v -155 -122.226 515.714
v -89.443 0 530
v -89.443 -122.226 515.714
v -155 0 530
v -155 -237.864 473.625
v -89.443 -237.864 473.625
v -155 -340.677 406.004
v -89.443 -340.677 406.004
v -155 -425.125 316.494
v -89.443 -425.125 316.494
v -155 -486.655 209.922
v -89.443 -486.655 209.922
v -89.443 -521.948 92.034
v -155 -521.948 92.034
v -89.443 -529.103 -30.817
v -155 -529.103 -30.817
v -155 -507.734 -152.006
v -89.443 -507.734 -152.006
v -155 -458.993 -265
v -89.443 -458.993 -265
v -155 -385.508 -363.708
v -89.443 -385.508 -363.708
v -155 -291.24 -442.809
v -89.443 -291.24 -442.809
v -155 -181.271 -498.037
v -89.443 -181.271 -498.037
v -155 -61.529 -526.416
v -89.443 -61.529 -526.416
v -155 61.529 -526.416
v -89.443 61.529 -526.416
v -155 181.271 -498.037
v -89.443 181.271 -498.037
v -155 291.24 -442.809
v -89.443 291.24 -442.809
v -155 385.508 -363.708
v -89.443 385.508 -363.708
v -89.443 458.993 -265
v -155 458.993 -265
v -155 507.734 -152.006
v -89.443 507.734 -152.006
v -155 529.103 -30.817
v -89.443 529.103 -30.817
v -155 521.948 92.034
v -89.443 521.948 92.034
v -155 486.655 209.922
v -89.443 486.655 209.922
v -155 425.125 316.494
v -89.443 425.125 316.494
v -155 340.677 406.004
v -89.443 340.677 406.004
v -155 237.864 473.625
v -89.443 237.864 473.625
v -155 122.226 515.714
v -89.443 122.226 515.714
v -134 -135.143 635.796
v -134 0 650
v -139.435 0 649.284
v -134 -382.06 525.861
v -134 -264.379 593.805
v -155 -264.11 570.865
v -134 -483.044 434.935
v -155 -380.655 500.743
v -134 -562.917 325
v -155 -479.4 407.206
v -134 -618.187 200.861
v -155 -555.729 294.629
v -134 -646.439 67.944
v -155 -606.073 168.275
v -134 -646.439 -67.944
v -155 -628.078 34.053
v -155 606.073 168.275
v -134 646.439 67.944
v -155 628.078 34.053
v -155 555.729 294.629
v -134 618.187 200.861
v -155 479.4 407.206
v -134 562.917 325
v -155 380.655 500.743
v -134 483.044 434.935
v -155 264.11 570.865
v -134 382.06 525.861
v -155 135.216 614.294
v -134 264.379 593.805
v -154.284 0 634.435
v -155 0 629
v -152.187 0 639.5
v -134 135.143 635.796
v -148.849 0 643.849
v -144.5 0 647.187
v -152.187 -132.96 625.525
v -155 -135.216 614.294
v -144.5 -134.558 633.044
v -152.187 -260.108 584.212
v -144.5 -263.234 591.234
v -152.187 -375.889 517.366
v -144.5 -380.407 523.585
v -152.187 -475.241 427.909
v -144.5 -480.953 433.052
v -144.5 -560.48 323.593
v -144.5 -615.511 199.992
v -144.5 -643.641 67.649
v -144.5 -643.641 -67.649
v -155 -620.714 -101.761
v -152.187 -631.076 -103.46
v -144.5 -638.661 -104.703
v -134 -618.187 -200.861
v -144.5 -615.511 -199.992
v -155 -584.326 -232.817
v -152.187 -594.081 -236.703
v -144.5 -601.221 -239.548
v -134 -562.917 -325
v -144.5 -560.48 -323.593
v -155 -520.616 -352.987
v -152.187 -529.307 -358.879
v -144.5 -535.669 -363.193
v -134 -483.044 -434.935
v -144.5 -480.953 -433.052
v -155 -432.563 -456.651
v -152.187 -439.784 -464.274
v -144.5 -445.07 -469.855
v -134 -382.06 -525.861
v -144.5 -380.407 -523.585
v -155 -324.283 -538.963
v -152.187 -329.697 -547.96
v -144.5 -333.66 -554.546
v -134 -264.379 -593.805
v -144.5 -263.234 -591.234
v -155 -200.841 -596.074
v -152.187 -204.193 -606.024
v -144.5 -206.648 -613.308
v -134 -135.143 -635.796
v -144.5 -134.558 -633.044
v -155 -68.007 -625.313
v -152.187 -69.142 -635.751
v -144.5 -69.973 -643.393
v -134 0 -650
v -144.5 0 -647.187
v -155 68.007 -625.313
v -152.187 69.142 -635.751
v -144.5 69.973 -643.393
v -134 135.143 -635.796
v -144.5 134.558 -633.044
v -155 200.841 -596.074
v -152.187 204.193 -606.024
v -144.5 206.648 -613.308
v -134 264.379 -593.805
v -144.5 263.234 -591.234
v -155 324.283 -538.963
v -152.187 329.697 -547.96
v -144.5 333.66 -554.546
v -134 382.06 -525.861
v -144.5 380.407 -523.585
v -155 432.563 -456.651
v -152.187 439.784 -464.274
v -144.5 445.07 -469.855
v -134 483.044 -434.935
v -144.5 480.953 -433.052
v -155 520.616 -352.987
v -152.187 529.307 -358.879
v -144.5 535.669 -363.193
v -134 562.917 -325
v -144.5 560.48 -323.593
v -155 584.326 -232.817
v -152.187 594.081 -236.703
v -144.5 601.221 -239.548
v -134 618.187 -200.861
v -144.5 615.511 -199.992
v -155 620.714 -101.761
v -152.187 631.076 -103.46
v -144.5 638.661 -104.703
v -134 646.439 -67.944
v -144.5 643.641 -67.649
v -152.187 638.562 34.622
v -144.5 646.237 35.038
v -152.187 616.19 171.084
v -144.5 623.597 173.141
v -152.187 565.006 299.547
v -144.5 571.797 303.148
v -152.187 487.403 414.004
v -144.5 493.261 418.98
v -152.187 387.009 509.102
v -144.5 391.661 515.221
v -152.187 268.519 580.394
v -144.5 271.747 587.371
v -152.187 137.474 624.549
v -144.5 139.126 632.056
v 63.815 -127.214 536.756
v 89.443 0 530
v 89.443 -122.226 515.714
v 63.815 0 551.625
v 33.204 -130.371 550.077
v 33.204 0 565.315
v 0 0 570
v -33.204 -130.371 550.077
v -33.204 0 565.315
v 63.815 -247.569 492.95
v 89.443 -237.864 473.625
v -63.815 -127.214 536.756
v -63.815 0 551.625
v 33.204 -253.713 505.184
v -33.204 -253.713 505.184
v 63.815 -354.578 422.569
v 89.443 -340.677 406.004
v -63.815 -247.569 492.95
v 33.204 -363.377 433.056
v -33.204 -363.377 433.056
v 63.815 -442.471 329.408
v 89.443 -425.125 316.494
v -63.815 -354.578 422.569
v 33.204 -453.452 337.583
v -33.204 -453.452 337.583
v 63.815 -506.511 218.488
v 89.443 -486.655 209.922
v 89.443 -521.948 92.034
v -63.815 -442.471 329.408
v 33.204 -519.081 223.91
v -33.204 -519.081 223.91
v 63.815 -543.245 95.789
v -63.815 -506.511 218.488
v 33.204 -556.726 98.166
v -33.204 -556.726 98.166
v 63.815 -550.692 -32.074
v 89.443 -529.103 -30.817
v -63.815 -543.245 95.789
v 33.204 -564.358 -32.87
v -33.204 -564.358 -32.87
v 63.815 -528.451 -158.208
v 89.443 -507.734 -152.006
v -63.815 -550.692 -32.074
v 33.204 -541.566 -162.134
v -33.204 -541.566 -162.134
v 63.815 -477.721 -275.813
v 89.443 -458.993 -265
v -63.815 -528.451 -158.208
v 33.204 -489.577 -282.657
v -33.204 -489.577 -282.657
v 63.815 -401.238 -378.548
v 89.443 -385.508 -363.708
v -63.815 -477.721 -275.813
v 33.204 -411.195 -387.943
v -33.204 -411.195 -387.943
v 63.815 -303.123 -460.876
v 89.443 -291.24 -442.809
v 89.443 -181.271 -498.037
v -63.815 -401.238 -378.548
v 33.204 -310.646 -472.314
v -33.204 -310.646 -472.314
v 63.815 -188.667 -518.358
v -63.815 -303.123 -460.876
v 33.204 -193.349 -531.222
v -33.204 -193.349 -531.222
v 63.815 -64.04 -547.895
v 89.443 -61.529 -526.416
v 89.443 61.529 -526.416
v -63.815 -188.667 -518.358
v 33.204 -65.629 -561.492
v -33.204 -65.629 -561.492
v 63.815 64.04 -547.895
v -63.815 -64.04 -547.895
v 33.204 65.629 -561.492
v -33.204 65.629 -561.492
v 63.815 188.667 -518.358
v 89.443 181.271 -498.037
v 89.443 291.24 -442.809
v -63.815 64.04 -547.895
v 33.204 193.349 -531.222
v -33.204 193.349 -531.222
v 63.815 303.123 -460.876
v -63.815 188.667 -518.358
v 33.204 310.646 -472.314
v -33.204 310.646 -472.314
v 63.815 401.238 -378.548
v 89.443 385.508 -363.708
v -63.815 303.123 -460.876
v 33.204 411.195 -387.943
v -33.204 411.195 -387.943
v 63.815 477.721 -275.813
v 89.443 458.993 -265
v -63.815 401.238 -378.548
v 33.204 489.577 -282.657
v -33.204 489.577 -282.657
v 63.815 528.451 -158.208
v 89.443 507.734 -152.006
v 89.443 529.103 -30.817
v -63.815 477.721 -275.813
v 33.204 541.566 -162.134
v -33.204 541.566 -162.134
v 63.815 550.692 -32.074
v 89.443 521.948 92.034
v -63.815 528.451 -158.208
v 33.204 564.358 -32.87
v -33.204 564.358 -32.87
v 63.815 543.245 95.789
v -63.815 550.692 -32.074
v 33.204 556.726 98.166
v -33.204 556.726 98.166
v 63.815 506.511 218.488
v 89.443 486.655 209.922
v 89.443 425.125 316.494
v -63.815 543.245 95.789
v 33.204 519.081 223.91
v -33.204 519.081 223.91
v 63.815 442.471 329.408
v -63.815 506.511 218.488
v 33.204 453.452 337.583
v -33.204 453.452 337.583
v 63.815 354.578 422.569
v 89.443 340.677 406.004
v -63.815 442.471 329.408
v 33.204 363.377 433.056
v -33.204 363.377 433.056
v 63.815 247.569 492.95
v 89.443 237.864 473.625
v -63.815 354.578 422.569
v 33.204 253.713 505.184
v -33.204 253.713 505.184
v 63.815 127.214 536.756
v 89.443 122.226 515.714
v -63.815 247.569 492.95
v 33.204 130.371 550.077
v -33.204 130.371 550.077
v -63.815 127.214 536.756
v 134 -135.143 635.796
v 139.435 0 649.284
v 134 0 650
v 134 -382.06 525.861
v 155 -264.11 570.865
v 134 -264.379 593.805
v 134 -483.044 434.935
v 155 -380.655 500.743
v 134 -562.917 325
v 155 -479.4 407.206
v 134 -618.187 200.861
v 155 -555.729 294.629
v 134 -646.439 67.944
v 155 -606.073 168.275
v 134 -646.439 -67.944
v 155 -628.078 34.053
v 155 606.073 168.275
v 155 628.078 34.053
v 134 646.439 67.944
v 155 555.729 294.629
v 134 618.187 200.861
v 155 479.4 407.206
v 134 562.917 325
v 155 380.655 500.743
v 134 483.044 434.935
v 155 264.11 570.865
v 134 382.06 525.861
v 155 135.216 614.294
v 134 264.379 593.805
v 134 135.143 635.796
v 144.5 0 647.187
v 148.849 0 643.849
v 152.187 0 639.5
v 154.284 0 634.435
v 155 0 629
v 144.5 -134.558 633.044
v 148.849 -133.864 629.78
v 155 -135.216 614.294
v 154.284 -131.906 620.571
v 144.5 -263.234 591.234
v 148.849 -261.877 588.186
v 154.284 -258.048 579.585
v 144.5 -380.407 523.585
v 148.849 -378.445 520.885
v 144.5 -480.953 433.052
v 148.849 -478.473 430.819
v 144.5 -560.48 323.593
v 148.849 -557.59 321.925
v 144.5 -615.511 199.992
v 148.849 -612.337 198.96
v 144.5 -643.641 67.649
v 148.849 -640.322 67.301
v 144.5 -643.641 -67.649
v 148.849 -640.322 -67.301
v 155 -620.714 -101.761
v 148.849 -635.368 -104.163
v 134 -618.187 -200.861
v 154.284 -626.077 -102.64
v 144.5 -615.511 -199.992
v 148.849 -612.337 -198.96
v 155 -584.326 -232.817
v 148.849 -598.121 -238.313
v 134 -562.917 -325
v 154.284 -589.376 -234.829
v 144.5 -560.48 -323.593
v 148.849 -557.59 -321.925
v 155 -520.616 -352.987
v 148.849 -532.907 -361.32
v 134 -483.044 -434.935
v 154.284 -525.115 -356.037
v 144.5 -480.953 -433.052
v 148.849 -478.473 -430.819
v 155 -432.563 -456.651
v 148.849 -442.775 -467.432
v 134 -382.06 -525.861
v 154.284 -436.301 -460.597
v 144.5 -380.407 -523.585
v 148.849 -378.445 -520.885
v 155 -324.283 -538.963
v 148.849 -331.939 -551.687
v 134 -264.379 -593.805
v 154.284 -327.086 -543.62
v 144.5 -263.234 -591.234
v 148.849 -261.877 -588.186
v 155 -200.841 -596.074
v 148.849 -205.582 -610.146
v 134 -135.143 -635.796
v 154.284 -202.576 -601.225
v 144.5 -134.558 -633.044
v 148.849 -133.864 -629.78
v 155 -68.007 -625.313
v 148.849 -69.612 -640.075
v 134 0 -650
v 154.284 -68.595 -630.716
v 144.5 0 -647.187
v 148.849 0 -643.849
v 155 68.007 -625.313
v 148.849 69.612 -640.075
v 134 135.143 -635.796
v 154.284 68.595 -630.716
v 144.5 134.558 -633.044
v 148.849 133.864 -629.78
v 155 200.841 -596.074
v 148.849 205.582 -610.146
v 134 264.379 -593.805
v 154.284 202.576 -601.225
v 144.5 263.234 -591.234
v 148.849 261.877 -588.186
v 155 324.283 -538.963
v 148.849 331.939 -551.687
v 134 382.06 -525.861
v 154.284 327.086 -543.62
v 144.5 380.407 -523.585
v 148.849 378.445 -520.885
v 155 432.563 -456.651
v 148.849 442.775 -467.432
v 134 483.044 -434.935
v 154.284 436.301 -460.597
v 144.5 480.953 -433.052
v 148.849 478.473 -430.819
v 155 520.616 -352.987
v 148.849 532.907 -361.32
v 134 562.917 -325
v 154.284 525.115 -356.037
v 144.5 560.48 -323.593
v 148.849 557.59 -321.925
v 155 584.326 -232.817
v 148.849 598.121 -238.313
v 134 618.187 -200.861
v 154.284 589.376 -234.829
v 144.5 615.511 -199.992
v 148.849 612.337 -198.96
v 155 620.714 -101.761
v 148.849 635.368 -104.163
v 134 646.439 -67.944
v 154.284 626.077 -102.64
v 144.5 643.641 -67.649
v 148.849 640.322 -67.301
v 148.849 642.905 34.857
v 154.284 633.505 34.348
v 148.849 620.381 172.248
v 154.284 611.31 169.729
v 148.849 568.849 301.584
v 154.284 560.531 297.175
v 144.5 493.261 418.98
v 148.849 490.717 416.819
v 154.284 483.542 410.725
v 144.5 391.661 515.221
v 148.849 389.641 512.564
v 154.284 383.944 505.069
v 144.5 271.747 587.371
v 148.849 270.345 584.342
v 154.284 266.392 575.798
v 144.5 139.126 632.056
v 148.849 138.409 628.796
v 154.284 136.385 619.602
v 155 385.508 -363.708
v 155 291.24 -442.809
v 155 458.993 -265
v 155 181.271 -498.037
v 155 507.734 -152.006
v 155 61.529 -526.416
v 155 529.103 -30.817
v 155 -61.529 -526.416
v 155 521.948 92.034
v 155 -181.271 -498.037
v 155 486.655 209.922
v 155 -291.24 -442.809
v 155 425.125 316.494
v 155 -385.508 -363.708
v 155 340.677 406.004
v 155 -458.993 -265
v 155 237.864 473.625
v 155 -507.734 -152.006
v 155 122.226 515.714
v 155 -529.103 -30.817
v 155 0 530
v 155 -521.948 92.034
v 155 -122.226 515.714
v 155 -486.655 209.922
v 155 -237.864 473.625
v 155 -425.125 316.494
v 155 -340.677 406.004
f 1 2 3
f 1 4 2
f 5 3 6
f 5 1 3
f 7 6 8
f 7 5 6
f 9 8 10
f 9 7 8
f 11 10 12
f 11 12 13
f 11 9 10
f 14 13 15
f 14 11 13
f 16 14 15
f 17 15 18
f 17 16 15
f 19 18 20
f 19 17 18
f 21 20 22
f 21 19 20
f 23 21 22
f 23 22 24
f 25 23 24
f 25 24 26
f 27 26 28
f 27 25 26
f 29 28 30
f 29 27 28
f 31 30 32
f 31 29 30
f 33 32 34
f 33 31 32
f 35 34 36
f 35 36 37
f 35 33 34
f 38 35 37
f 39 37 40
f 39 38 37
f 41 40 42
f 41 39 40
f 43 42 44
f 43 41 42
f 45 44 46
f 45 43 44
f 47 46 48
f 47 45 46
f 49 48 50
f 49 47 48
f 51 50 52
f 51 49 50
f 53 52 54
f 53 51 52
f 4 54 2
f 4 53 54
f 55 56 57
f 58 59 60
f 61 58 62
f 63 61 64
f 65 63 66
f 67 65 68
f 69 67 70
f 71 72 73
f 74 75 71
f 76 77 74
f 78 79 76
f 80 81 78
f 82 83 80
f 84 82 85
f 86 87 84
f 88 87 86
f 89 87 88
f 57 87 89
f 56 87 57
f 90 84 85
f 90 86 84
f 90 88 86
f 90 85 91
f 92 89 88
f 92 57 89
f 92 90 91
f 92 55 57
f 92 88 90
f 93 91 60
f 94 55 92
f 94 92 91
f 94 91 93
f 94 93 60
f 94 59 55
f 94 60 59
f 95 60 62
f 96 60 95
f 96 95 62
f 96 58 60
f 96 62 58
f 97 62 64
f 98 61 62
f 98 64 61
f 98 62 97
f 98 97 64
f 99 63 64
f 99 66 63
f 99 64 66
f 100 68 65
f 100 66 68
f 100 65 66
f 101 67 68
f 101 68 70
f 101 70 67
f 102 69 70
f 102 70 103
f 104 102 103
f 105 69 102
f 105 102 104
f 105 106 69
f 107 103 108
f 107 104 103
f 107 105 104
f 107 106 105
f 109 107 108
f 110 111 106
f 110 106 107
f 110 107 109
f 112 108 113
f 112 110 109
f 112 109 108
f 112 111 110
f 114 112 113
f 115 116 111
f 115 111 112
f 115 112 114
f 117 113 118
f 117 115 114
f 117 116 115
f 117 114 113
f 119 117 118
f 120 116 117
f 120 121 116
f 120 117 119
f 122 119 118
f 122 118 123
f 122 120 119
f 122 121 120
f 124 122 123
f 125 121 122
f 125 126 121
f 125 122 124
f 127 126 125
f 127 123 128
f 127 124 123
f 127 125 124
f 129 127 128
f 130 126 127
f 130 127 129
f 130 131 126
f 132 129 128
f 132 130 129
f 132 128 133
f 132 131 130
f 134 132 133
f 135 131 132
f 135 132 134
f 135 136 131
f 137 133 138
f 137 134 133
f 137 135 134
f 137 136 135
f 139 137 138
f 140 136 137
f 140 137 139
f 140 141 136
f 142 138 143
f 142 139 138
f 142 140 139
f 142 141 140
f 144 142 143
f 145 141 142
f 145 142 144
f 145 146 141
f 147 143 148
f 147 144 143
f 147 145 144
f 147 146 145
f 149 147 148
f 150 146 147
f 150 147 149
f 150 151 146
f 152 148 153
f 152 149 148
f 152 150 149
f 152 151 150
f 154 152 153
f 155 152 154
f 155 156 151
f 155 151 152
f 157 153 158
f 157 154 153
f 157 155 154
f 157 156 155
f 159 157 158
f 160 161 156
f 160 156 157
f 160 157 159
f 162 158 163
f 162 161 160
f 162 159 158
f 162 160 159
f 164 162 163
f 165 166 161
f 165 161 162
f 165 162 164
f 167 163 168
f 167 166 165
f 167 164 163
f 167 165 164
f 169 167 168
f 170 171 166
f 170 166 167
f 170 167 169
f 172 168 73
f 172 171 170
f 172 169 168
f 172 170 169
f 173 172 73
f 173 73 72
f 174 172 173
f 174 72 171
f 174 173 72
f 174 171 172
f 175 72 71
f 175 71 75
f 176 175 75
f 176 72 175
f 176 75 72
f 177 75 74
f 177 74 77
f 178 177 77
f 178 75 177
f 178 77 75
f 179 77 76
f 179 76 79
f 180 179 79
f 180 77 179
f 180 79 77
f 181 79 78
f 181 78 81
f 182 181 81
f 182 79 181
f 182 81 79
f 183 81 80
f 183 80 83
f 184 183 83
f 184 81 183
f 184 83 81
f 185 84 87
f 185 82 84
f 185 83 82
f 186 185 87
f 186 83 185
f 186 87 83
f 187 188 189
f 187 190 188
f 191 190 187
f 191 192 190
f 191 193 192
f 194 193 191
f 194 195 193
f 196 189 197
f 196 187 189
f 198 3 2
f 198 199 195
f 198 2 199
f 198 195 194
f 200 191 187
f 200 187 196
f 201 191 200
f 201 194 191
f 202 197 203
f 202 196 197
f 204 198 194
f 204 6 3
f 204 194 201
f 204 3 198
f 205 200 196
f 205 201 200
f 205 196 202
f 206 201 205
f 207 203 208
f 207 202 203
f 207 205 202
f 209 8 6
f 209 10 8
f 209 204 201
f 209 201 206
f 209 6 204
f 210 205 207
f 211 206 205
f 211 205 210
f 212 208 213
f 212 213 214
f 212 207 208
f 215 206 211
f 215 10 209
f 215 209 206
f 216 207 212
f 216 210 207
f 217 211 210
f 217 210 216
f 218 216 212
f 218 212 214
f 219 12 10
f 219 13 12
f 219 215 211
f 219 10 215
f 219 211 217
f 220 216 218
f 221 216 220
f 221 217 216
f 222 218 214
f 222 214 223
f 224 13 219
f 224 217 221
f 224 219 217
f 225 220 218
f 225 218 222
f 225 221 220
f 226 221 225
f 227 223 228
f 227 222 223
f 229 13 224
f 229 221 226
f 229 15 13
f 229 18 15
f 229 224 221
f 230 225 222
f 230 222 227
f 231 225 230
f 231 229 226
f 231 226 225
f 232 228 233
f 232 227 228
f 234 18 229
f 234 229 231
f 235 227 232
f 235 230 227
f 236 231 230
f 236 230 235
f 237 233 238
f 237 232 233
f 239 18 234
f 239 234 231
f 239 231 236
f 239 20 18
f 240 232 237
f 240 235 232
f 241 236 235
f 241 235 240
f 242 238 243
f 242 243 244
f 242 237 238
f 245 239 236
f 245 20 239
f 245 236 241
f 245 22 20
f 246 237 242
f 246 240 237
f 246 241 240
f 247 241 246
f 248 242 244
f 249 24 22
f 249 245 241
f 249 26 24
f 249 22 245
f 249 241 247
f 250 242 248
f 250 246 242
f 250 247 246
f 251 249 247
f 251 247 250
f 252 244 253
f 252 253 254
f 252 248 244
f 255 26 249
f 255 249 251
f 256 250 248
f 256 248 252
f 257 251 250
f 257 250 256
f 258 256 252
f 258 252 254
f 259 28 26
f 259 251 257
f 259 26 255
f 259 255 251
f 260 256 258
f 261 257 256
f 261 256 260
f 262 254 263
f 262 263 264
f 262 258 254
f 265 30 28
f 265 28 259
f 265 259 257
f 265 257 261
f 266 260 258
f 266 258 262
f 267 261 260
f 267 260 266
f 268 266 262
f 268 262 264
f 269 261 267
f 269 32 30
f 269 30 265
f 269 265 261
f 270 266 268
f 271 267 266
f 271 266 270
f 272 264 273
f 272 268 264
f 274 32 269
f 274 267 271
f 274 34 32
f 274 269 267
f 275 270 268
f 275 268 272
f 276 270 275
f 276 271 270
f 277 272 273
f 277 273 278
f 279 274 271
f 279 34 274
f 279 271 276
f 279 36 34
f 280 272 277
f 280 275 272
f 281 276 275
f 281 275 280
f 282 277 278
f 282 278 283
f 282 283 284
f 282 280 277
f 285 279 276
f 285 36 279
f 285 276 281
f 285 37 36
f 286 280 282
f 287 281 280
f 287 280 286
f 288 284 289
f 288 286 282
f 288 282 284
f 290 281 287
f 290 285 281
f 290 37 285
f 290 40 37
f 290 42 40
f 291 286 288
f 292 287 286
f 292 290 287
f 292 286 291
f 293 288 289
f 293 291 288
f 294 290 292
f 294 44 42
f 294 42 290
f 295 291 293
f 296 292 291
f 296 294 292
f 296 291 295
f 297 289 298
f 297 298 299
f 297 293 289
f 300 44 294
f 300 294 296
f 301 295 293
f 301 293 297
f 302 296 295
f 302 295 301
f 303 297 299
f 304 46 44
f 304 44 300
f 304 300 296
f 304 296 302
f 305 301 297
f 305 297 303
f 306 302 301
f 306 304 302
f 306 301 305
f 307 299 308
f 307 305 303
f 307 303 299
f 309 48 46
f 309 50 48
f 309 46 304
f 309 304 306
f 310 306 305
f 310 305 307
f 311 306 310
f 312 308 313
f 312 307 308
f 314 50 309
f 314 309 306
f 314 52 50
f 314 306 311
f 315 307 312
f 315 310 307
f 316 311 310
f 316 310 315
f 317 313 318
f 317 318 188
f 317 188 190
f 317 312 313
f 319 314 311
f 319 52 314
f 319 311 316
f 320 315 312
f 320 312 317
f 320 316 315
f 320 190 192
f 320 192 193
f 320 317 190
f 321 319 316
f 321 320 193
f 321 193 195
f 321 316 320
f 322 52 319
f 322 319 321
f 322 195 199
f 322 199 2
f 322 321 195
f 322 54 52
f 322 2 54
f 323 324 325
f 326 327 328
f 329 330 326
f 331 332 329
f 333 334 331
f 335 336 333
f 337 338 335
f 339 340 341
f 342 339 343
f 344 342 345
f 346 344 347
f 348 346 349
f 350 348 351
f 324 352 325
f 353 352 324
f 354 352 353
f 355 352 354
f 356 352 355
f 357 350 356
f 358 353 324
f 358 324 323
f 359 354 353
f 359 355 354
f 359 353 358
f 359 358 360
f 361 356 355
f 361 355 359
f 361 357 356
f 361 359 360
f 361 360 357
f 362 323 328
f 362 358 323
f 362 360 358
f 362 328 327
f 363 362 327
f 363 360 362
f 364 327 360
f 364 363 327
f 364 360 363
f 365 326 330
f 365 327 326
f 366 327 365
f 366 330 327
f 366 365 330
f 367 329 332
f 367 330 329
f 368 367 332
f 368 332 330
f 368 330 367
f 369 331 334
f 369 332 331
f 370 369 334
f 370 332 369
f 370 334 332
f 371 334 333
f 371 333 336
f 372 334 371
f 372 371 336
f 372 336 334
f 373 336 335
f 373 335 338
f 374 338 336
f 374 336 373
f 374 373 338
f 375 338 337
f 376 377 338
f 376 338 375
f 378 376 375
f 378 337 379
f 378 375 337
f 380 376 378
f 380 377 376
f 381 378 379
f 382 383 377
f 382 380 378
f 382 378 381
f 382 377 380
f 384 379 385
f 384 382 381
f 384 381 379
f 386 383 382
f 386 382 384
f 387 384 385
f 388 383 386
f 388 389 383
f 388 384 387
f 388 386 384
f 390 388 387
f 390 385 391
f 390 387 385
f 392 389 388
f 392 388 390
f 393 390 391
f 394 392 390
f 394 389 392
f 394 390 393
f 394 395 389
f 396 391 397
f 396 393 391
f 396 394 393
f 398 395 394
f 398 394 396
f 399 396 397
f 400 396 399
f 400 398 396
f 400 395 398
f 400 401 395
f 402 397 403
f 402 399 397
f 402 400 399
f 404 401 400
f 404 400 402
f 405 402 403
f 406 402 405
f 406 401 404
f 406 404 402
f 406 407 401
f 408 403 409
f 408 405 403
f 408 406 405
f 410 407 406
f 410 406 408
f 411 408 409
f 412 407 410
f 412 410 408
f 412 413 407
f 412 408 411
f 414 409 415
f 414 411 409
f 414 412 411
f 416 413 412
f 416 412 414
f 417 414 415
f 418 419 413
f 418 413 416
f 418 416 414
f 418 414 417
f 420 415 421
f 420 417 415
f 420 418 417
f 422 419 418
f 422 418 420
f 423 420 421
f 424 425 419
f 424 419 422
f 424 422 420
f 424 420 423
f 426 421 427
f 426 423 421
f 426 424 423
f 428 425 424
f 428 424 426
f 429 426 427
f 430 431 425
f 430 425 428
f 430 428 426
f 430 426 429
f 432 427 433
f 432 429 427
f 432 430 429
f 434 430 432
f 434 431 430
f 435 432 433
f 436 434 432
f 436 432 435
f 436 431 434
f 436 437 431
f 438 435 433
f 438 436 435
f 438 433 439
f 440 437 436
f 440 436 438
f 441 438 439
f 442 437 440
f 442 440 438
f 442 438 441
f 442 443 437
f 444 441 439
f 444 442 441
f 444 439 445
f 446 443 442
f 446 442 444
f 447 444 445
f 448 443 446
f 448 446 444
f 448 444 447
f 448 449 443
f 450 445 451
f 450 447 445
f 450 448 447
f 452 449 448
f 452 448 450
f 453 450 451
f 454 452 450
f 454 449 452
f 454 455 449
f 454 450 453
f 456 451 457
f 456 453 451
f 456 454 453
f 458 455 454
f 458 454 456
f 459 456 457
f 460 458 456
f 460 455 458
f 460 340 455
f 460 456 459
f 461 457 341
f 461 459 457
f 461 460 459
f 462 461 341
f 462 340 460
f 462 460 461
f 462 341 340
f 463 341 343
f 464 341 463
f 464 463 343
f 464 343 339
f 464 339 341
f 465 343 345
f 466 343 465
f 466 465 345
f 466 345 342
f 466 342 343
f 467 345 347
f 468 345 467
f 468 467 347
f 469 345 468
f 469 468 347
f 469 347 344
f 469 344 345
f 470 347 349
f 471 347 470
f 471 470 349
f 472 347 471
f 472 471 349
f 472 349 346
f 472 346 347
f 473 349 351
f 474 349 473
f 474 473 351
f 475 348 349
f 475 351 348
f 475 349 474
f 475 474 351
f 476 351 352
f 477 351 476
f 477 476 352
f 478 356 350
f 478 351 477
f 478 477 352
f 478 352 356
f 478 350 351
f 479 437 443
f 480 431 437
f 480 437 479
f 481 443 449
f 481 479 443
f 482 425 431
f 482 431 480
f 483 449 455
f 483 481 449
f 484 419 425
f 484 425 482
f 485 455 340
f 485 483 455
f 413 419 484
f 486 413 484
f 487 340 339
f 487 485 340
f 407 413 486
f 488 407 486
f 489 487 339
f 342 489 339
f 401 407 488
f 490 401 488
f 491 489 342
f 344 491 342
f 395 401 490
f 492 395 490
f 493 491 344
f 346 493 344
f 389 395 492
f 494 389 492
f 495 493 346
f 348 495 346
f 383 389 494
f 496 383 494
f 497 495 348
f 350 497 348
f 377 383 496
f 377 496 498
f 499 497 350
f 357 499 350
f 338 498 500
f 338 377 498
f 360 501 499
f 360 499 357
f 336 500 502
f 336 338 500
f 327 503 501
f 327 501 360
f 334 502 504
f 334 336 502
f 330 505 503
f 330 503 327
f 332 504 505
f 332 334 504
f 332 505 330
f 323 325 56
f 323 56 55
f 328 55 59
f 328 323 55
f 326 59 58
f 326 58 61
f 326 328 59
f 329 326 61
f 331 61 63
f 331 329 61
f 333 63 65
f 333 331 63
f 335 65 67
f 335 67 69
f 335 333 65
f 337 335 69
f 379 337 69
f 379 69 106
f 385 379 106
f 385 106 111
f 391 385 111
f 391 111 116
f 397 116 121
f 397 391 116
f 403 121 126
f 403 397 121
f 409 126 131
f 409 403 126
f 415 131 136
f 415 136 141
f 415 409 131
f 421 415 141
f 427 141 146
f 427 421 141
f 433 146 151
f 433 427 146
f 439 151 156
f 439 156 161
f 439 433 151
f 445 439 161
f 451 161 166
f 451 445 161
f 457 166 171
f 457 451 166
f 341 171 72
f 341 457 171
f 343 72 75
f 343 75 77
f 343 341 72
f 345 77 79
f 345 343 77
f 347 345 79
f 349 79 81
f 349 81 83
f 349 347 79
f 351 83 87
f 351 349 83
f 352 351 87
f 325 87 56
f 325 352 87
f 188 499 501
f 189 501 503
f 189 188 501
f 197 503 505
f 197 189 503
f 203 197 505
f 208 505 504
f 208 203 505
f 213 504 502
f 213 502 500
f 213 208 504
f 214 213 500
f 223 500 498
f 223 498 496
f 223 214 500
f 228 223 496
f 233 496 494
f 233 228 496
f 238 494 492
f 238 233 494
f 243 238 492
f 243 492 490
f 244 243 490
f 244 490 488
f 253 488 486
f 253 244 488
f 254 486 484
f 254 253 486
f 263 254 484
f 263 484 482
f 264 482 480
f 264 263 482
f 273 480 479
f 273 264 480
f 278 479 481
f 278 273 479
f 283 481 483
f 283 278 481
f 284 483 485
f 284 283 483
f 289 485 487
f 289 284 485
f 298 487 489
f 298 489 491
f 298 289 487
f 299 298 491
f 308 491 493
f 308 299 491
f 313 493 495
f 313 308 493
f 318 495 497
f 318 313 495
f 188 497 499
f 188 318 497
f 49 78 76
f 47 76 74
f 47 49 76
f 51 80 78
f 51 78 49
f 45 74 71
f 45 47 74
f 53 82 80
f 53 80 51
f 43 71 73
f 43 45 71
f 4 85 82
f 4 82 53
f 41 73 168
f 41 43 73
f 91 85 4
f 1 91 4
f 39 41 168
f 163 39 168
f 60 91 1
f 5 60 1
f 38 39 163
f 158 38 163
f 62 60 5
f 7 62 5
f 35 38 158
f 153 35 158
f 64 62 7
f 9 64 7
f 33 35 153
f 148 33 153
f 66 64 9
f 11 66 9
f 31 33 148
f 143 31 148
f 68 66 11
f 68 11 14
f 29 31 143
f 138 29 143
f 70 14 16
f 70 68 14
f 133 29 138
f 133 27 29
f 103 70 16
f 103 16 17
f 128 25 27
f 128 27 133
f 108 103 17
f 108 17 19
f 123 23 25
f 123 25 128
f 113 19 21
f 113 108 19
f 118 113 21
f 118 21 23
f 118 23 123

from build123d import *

# Parameters (mm, degrees)
FILLET2_R = 21


with BuildPart() as part:
    # Sketch1 → Revolve1 (revolve)
    with BuildSketch(Plane.XY, mode=Mode.PRIVATE) as revolve1_sk:
        with BuildLine():
            Line((155, 530), (89.4427191, 530))
            ThreePointArc((89.4427191, 530), (0, 570), (-89.4427191, 530))
            Line((-89.4427191, 530), (-155, 530))
            Line((-155, 530), (-155, 650))
            Line((-155, 650), (155, 650))
            Line((155, 650), (155, 530))
        make_face()
    revolve(revolve1_sk.sketch.rotate(Axis((-124.426605505, 0, 0), (1, 0, 0)), 90), axis=Axis((-124.426605505, 0, 0), (1, 0, 0)))

    # Fillet2
    fillet2_edges = [part.edges().sort_by_distance(p)[0] for p in [
        (155, 0, -650),
        (-155, 0, -650),
    ]]
    fillet(fillet2_edges, radius=FILLET2_R)


solid = part.part
